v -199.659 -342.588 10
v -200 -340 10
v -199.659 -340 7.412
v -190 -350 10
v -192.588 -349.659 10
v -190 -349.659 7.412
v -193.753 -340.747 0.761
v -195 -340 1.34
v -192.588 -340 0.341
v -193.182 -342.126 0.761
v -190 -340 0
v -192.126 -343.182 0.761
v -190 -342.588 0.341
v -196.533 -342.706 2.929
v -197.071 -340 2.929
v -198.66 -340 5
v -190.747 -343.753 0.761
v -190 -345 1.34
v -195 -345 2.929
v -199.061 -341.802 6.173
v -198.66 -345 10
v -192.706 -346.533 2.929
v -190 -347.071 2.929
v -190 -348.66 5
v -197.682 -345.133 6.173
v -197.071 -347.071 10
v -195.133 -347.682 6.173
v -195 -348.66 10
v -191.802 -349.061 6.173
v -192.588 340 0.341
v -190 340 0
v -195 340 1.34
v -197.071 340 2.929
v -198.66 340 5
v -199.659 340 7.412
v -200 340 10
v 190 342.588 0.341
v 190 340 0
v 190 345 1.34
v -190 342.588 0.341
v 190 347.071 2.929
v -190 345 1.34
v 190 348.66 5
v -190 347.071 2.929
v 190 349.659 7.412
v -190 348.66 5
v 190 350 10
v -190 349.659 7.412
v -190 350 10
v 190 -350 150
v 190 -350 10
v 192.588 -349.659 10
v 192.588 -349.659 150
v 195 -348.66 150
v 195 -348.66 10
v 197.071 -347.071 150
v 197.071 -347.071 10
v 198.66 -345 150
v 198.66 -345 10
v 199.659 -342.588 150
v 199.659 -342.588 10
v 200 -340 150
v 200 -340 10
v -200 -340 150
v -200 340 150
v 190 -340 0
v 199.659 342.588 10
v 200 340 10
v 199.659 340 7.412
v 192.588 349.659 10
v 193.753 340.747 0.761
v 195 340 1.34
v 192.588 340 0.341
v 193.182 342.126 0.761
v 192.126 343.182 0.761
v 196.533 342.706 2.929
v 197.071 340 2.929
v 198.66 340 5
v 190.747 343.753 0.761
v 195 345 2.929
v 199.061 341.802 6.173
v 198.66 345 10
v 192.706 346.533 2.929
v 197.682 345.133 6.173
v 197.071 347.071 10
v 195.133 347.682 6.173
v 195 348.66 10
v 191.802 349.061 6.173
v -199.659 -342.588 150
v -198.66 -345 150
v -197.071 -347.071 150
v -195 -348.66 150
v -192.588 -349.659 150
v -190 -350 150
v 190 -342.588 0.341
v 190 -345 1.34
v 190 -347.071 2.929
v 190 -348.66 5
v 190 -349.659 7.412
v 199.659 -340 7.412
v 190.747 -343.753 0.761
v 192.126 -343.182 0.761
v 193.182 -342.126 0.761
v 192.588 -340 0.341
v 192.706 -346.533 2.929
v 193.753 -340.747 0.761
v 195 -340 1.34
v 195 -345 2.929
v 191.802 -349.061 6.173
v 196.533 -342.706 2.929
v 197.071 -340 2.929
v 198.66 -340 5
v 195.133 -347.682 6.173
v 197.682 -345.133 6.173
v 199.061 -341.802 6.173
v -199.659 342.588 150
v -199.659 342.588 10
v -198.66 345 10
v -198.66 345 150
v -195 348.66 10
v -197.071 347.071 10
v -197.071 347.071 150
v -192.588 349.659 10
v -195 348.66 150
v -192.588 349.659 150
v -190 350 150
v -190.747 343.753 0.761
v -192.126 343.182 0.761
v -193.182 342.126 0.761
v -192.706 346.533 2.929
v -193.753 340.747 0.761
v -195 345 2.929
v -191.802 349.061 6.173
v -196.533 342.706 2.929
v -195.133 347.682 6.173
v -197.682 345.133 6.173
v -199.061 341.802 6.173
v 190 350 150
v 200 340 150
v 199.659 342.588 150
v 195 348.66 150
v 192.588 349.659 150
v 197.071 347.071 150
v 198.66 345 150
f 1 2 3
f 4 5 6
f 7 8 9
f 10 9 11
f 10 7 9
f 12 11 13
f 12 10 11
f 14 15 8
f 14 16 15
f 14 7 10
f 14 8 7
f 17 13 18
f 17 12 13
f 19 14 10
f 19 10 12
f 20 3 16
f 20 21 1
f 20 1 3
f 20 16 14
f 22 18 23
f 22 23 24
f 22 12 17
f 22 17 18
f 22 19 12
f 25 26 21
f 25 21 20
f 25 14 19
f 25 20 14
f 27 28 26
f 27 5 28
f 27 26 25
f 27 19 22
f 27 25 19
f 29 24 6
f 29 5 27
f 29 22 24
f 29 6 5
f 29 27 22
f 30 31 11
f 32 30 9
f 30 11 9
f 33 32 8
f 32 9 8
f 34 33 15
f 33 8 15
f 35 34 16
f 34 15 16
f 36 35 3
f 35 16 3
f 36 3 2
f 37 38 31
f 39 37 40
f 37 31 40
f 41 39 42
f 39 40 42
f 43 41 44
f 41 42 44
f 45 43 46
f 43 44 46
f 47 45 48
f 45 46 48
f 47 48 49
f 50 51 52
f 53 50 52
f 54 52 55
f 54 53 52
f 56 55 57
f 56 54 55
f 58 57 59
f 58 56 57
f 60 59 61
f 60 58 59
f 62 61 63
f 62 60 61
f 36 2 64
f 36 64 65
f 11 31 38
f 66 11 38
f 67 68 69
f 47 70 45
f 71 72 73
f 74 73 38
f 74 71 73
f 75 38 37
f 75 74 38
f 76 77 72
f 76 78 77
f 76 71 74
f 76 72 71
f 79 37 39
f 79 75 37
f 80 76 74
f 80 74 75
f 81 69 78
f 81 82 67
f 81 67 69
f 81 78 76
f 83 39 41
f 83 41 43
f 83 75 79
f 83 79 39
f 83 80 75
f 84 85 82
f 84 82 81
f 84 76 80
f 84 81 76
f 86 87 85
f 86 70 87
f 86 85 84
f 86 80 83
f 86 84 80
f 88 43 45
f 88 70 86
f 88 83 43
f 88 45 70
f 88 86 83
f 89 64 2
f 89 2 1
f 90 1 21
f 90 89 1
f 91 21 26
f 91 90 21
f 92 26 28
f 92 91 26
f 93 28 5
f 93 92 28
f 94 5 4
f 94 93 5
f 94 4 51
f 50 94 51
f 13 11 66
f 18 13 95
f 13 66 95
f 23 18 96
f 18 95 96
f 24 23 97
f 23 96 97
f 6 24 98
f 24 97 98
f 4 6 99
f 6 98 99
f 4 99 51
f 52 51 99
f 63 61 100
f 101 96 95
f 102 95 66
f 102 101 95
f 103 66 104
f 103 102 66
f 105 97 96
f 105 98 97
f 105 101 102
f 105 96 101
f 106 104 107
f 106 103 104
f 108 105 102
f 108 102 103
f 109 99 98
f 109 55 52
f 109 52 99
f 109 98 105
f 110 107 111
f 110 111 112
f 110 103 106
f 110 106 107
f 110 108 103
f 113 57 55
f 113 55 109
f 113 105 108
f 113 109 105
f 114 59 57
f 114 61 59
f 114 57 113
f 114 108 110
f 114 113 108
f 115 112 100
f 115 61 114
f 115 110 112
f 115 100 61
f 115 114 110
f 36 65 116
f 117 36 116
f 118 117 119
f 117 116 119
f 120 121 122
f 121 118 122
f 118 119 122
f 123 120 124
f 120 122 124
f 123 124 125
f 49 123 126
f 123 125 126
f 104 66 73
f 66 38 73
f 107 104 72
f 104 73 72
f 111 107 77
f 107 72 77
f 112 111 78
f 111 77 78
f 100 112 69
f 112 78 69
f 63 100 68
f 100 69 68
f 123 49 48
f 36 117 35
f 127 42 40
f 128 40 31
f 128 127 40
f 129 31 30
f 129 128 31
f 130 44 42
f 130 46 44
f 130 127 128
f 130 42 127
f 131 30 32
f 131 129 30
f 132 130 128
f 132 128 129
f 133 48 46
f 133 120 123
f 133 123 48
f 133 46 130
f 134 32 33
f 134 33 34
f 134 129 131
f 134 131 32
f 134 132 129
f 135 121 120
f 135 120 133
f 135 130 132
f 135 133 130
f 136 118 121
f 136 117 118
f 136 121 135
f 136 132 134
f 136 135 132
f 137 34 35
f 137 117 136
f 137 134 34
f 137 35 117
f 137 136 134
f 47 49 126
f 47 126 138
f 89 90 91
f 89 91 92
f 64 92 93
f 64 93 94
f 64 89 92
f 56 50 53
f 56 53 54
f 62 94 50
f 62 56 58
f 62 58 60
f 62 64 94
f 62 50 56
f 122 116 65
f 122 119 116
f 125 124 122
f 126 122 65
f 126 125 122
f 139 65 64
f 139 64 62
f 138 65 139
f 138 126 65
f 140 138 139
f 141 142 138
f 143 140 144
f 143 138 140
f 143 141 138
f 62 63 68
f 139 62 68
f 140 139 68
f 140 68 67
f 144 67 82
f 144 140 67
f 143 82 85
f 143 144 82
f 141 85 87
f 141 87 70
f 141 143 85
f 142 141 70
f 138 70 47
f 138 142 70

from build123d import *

# Parameters (mm, degrees)
F0_W     = 400
F0_H     = 700
F1_DEPTH = 150
F2_R     = 10
F3_R     = 10


with BuildPart() as f1:
    # F0 (on Top) → F1 (new body)
    with BuildSketch(Plane.XY):
        Rectangle(F0_W, F0_H)
    extrude(amount=F1_DEPTH)

    # F2
    f2_edges = [f1.edges().sort_by_distance(p)[0] for p in [
        (200, 350, 75),
        (200, -350, 75),
        (-200, -350, 75),
        (-200, 350, 75),
    ]]
    fillet(f2_edges, radius=F2_R)

    # F3
    f3_edges = [f1.edges().sort_by_distance(p)[0] for p in [
        (200, 0, 0),
        (0, 350, 0),
        (-200, 0, 0),
    ]]
    fillet(f3_edges, radius=F3_R)


solid = f1.part
